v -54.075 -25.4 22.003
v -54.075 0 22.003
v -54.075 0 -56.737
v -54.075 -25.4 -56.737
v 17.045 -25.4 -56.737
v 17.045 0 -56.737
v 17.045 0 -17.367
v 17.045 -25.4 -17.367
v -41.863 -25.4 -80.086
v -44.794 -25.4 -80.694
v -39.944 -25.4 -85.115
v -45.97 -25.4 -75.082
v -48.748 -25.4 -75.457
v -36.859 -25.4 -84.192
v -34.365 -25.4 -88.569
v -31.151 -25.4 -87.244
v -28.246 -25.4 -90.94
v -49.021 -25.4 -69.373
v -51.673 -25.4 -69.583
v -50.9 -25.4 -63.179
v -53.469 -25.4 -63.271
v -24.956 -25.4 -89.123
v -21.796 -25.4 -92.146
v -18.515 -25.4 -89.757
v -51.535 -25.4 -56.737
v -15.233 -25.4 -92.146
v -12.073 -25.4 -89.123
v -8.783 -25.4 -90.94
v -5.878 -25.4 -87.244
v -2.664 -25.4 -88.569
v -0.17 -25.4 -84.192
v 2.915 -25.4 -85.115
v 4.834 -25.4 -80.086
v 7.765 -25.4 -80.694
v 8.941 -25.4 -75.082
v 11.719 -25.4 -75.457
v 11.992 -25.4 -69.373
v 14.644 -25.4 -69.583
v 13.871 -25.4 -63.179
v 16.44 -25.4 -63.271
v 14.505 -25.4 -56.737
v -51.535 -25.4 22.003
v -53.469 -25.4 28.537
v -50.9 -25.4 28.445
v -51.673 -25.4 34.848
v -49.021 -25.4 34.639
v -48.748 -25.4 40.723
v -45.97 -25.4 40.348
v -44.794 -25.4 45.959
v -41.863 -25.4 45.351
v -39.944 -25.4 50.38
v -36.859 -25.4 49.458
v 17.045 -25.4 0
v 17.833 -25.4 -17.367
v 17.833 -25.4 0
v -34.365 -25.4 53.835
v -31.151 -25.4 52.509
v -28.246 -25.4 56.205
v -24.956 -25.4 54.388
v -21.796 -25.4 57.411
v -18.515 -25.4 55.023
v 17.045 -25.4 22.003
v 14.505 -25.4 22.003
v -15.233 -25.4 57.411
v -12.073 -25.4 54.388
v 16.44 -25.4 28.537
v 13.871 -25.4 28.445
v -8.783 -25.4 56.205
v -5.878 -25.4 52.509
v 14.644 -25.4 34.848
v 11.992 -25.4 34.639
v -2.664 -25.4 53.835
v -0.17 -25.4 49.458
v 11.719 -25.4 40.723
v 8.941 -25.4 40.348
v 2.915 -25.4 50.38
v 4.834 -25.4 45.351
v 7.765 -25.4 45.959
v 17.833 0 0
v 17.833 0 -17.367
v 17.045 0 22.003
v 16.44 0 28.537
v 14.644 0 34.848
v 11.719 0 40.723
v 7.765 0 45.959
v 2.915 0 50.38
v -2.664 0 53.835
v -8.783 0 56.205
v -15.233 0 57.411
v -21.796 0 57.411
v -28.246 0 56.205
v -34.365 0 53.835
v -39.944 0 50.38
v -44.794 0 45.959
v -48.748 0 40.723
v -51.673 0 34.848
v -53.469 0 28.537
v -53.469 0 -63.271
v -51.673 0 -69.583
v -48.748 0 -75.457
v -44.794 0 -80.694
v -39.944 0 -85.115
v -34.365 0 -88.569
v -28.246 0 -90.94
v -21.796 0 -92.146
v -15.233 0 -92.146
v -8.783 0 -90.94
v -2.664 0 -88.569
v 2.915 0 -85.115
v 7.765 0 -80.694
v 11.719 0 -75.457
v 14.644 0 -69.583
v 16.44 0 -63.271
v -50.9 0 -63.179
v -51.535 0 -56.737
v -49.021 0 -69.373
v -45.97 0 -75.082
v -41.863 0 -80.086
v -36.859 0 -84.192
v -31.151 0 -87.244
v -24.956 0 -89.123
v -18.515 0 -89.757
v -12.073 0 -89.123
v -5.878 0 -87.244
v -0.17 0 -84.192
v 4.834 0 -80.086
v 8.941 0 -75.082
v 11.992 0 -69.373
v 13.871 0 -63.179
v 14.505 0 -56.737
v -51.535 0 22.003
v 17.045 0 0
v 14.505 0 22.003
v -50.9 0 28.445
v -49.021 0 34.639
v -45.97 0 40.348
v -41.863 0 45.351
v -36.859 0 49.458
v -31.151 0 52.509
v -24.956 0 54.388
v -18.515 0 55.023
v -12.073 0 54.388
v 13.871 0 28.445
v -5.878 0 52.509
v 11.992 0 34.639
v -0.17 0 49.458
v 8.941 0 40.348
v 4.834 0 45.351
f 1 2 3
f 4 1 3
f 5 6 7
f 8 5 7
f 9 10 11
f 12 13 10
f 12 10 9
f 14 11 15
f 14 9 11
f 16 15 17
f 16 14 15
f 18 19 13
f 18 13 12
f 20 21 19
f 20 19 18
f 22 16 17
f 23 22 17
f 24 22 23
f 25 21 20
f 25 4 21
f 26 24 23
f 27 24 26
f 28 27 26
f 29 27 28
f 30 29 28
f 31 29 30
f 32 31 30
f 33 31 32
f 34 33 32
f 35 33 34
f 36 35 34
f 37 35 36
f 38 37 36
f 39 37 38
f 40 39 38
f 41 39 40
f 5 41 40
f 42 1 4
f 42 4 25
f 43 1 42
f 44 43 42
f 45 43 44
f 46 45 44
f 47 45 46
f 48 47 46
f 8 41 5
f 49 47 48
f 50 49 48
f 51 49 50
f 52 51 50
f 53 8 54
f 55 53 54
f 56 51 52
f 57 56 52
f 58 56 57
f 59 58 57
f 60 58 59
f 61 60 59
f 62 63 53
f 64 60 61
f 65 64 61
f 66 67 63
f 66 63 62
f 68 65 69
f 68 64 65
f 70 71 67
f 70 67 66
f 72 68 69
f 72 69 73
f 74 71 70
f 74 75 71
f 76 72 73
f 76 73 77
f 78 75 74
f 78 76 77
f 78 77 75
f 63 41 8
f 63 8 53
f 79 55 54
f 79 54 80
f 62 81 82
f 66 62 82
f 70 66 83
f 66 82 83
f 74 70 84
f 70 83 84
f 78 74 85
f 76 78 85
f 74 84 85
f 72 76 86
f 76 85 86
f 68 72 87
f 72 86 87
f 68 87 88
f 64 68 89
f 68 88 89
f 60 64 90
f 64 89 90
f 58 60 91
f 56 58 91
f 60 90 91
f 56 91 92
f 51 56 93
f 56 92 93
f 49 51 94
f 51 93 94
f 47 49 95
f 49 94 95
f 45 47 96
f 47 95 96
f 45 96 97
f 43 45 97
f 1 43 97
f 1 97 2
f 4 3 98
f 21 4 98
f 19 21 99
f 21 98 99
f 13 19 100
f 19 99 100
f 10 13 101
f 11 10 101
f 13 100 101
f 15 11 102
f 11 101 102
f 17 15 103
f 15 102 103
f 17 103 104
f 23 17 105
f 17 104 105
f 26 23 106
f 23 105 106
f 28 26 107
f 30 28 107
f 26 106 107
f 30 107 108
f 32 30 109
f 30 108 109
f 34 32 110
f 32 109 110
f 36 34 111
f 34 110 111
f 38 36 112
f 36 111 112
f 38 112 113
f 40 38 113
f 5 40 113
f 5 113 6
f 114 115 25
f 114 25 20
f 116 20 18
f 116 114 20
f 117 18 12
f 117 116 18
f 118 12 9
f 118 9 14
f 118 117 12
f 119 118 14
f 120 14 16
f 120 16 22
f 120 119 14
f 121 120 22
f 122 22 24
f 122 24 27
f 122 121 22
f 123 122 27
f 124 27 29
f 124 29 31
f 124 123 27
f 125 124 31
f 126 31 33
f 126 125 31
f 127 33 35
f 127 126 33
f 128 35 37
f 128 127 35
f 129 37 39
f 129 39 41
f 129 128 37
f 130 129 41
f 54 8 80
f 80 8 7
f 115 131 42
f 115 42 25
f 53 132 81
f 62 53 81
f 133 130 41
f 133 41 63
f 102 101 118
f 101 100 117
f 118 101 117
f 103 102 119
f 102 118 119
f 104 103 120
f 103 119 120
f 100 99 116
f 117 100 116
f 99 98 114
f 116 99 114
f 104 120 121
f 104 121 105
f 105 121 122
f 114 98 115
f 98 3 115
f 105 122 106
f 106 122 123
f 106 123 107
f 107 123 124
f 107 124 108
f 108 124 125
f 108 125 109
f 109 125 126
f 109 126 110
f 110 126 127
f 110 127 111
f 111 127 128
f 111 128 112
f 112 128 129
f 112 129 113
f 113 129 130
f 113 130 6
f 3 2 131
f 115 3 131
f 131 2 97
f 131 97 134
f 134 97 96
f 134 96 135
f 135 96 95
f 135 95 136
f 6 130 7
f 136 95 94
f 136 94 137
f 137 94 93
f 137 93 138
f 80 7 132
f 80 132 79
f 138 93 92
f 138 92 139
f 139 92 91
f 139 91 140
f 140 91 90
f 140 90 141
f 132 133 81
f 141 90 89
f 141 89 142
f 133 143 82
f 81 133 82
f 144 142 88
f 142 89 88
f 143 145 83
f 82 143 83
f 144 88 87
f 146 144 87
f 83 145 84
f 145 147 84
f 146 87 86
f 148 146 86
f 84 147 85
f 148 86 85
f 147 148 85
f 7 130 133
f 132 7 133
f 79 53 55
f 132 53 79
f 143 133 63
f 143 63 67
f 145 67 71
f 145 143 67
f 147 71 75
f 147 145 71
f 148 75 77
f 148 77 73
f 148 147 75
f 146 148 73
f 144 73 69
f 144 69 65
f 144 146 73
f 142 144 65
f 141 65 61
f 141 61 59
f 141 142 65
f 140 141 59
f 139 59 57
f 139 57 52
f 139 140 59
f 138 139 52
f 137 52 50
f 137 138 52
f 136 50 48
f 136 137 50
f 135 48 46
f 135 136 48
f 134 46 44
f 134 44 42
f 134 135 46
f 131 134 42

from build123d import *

# Parameters (mm, degrees)
F1_DEPTH = 25.4
F2_T     = -2.54
F3_W     = 25.4
F3_H     = 17.367277
F4_DEPTH = 0.7874


with BuildPart() as f1:
    # F0 (on Front) → F1 (new body)
    with BuildSketch(Plane.XZ):
        with BuildLine():
            ThreePointArc((17.045487, 22.002723), (-18.514513, 57.562723), (-54.074513, 22.002723))
            Line((-54.074513, 22.002723), (-54.074513, -56.737277))
            ThreePointArc((-54.074513, -56.737277), (-18.514513, -92.297277), (17.045487, -56.737277))
            Line((17.045487, -56.737277), (17.045487, 22.002723))
        make_face()
    extrude(amount=F1_DEPTH)

    # F2
    f2_openings = [f1.faces().sort_by_distance(p)[0] for p in [
        (-18.514513, -25.4, -17.367277),
        (-18.514513, 0, -17.367277),
    ]]
    offset(amount=F2_T, openings=f2_openings)

    # F3 (on face) → F4 (join)
    with BuildSketch(Plane.YZ.offset(17.045487)):
        with Locations((-12.7, -8.683638)):
            Rectangle(F3_W, F3_H)
    extrude(amount=F4_DEPTH)


solid = f1.part
